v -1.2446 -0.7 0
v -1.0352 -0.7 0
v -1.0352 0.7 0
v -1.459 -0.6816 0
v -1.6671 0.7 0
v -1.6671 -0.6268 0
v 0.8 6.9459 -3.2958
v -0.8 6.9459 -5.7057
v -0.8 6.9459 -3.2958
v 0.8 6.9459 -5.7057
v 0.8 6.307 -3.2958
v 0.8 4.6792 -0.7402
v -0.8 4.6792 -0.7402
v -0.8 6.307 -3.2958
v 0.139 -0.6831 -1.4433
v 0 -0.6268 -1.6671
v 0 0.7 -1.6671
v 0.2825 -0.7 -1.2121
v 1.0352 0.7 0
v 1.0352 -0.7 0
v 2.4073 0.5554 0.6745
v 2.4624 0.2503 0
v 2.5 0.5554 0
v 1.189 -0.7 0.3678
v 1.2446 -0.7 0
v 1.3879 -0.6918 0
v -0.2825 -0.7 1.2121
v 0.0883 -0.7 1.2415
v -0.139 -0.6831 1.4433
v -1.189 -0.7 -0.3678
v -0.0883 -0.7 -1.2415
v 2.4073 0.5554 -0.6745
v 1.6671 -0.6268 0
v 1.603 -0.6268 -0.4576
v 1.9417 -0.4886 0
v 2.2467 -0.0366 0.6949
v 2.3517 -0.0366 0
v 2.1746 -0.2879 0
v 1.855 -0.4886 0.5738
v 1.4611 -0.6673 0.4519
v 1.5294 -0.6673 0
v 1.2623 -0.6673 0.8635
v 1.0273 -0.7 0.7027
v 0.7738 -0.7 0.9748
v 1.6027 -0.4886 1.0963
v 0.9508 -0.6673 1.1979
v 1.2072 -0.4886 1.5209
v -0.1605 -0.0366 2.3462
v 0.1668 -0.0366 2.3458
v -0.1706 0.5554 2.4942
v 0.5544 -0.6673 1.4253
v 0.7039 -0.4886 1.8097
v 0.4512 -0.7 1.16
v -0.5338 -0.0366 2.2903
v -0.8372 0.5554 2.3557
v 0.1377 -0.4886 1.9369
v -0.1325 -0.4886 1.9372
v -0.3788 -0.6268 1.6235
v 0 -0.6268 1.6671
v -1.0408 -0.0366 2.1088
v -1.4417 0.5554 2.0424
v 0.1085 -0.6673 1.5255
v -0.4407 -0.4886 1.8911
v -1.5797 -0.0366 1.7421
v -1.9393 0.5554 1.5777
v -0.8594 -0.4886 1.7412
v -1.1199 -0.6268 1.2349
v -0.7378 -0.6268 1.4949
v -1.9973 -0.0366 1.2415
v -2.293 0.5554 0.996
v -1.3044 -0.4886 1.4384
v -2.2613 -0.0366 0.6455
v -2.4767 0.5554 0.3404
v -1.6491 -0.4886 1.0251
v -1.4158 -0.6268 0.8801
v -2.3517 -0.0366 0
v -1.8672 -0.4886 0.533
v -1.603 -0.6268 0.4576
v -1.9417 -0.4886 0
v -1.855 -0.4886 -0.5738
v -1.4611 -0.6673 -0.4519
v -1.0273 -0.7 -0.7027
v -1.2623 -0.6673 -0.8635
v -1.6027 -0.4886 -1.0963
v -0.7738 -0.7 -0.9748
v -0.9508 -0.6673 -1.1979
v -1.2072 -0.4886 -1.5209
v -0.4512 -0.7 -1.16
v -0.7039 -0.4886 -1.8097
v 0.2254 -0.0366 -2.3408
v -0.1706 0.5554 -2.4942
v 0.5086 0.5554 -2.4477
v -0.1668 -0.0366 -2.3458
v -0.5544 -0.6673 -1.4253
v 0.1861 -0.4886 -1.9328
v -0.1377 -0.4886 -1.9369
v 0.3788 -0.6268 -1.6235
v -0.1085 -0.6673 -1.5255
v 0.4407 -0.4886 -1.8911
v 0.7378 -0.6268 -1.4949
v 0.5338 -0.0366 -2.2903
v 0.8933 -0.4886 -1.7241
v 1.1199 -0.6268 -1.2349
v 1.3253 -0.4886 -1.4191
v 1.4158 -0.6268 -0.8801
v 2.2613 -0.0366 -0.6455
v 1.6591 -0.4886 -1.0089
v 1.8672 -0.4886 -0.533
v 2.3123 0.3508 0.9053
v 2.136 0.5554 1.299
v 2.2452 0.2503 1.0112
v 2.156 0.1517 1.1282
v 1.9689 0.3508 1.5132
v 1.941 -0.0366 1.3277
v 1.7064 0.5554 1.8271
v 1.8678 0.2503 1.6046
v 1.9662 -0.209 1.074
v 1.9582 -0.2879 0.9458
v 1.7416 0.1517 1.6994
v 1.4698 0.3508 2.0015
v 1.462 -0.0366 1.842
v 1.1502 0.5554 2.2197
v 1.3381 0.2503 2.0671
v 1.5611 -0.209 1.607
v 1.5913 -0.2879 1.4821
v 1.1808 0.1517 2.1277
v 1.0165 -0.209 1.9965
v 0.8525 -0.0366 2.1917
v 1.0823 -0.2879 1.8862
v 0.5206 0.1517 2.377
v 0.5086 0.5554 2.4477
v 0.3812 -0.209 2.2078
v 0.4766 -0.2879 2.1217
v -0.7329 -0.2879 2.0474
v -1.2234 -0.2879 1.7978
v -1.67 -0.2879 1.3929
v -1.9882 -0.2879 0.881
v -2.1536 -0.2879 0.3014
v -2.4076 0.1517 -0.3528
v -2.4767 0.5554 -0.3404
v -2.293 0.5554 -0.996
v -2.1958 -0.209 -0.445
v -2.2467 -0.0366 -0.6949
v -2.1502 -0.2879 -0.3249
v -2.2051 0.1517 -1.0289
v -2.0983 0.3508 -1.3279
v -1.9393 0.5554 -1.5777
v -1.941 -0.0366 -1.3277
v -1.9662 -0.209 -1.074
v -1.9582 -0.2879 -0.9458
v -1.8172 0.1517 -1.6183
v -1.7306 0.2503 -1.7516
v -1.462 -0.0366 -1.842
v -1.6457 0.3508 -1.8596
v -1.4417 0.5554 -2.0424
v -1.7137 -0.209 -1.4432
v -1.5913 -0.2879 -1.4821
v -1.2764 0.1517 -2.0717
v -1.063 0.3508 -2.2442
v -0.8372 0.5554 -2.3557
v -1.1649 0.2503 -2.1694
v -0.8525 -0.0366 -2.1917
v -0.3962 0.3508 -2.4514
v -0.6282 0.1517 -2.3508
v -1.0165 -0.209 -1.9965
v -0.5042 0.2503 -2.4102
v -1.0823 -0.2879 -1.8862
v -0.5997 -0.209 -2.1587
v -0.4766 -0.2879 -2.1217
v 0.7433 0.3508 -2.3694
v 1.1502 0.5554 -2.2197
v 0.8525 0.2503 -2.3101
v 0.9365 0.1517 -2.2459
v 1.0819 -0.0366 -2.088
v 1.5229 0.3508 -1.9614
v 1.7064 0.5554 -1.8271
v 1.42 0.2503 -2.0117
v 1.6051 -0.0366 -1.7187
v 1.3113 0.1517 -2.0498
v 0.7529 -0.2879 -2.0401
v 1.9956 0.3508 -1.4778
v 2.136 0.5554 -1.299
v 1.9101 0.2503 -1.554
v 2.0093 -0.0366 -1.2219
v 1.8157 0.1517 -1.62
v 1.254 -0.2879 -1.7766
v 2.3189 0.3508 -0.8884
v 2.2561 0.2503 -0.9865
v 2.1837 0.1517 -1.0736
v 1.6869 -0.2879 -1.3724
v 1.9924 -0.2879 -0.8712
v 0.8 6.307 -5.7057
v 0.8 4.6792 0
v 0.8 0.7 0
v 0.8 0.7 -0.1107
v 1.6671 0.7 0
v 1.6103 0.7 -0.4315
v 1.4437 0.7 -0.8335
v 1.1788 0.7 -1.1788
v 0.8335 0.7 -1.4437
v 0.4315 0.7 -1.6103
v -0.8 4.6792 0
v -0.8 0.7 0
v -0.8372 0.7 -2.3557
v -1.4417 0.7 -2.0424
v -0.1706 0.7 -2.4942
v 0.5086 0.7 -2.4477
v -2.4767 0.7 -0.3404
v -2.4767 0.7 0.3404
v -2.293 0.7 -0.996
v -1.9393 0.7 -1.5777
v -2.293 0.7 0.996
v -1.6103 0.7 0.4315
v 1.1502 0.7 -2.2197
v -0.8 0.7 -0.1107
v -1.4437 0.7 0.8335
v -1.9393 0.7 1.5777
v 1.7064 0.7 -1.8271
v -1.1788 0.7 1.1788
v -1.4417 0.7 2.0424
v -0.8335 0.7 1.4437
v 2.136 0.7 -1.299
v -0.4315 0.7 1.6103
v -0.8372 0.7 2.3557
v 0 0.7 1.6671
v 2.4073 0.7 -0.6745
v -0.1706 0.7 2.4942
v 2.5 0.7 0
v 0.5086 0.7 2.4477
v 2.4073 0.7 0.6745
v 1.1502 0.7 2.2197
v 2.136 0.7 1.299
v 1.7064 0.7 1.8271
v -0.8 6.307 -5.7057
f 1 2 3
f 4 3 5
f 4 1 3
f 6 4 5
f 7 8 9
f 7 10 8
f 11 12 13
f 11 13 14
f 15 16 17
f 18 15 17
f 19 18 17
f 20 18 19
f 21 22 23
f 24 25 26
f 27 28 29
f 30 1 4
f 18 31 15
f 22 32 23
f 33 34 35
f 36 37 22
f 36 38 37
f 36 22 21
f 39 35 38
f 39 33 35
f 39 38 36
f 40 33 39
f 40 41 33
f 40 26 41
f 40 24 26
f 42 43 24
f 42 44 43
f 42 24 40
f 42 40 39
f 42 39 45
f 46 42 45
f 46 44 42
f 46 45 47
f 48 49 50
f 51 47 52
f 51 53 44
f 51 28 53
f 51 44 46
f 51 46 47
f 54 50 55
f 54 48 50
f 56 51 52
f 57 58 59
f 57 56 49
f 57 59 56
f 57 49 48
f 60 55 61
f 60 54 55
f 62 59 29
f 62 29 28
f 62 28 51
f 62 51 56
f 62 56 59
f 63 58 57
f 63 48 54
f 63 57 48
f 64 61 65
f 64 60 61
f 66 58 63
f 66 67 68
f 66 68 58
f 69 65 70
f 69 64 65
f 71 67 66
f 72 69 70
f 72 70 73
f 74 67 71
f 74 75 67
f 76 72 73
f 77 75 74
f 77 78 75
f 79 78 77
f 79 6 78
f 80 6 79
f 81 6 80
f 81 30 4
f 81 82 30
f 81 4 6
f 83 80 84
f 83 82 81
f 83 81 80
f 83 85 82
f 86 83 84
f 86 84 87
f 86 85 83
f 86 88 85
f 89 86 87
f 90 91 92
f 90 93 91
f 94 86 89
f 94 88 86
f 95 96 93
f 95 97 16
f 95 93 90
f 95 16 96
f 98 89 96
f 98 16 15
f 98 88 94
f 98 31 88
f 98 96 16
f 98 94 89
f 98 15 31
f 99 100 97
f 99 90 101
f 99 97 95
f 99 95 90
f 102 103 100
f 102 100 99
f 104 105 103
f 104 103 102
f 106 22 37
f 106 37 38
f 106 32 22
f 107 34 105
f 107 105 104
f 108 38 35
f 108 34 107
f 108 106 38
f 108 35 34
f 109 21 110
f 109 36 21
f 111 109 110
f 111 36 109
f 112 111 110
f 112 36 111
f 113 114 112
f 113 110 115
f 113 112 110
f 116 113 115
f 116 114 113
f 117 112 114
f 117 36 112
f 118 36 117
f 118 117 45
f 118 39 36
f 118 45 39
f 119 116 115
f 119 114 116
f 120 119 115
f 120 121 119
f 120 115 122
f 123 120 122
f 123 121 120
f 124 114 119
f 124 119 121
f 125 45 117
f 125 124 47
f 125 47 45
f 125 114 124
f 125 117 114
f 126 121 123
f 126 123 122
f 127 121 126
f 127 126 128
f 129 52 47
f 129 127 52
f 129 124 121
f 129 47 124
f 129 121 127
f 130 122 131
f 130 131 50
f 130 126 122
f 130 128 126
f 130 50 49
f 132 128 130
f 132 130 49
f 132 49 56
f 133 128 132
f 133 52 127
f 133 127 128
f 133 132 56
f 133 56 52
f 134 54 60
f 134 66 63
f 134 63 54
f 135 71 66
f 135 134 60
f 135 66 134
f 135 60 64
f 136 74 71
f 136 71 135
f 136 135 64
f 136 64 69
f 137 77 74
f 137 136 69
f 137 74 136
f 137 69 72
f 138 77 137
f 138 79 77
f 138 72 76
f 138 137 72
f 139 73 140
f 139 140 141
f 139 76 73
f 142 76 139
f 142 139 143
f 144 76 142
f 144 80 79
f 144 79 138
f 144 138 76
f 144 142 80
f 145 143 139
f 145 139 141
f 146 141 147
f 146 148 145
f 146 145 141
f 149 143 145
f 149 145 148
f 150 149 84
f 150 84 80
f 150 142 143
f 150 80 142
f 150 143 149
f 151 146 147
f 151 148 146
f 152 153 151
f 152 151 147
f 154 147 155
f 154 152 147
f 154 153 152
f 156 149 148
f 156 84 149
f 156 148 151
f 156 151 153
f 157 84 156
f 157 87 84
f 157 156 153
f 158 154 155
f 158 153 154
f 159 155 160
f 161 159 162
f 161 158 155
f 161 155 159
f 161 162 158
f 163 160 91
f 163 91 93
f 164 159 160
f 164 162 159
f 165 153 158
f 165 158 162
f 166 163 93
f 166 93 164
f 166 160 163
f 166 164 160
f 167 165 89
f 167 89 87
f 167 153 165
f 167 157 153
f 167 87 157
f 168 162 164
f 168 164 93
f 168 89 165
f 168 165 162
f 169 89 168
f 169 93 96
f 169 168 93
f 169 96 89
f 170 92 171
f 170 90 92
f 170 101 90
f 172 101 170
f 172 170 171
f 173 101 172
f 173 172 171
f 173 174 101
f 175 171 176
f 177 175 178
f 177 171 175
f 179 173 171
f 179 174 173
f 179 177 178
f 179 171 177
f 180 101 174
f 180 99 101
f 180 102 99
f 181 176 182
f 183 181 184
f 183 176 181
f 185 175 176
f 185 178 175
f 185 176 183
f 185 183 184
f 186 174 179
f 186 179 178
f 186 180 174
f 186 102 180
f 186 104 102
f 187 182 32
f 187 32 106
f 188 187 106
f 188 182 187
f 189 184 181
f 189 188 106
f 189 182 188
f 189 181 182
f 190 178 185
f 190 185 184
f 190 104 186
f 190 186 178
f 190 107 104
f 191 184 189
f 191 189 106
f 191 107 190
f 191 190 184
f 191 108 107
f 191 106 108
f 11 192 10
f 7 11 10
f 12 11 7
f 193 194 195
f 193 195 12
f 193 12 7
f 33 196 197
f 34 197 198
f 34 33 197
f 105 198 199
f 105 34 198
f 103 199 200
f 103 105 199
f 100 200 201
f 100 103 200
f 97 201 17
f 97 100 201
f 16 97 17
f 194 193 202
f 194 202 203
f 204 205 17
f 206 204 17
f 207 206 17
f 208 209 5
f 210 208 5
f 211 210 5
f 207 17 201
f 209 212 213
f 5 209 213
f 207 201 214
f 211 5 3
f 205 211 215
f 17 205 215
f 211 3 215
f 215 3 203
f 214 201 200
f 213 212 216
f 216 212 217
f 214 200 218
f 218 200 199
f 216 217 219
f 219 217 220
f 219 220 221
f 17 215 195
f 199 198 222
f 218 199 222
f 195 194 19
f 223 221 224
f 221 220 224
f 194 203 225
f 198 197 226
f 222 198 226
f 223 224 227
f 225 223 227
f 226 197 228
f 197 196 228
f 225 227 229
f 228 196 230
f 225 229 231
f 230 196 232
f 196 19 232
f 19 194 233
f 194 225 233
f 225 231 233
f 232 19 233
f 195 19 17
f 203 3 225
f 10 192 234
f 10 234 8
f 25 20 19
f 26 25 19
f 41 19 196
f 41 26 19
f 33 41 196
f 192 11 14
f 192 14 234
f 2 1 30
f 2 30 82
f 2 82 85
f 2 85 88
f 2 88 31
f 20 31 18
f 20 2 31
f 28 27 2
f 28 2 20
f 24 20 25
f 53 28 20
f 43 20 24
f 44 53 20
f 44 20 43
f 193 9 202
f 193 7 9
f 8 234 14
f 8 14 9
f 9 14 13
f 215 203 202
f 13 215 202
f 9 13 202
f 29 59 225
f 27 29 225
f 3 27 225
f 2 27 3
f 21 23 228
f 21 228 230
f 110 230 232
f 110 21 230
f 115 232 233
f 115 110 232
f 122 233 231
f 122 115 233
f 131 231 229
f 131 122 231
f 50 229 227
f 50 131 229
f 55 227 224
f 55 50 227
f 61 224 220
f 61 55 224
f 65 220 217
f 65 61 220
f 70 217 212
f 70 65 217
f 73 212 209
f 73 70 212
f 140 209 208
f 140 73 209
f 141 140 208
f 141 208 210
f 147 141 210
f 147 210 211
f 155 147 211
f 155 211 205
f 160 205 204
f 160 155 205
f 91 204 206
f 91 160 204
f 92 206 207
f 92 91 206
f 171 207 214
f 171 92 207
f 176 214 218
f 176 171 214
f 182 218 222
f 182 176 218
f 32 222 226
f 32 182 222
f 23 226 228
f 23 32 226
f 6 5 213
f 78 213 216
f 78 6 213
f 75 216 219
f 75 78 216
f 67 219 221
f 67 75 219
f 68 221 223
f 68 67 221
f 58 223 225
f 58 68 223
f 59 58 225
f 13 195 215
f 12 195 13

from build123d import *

# Parameters (mm, degrees)
F0_R     = 2.5
F2_DEPTH = 0.7
F3_DEPTH = 0.8


# Not quite as in the source:
# - a fillet or chamfer that OpenCascade refuses, or shapes differently, is made with other operations: its cross-section is extruded or revolved along the edge and cut away or added


with BuildPart() as f2:
    # F0 (on Front) → F2 (new body, symmetric)
    with BuildSketch(Plane.XZ):
        Circle(F0_R)
        with BuildLine():
            ThreePointArc((0, 1.6670872347), (1.1788086885, 1.1788086885), (1.6670872347, 0))
            ThreePointArc((1.6670872347, 0), (1.1788086885, -1.1788086885), (0, -1.6670872347))
            ThreePointArc((0, -1.6670872347), (-1.1788086885, -1.1788086885), (-1.6670872347, 0))
            ThreePointArc((-1.6670872347, 0), (-1.1788086885, 1.1788086885), (0, 1.6670872347))
        make_face(mode=Mode.SUBTRACT)
        Polygon((1.035158575, 0), (0, 1.6670872347), (-1.035158575, 0), (0, -1.6670872347), align=None)
        with BuildLine():
            Line((1.035158575, 0), (1.6670872347, 0))
            ThreePointArc((1.6670872347, 0), (1.1788086885, 1.1788086885), (0, 1.6670872347))
            Line((0, 1.6670872347), (1.035158575, 0))
        make_face()
        with BuildLine():
            ThreePointArc((-1.6670872347, 0), (-1.1788086885, -1.1788086885), (0, -1.6670872347))
            Line((0, -1.6670872347), (-1.035158575, 0))
            Line((-1.035158575, 0), (-1.6670872347, 0))
        make_face()
    extrude(amount=F2_DEPTH, both=True)

    # F1 (on Right) → F3 (join, symmetric)
    with BuildSketch(Plane.YZ):
        Polygon((4.6792123099, 0), (0, 0), (4.6792123099, -0.7401879564), (6.3069890554, -3.2957927736), (6.3069890554, -4.3182368269), (6.3069890554, -5.7057410895), (6.9458728476, -5.7057410895), (6.9458728476, -4.3182368269), (6.9458728476, -3.2957927736), align=None)
    extrude(amount=F3_DEPTH, both=True)

    # F4: fillet of radius 1.2553910524 on 1 edges, made by hand

    # F4_s1 → F4_t2 (revolve, cut)
    with BuildSketch(Plane.XY):
        with BuildLine():
            ThreePointArc((2.5, 0.5553910524), (2.1323044738, -0.3323044738), (1.2446089476, -0.7))
            Line((1.2446089476, -0.7), (2.5, -0.7))
            Line((2.5, -0.7), (2.5, 0.5553910524))
        make_face()
    revolve(axis=Axis((0, -0.7, 0), (0, -1, 0)), mode=Mode.SUBTRACT)


solid = f2.part
